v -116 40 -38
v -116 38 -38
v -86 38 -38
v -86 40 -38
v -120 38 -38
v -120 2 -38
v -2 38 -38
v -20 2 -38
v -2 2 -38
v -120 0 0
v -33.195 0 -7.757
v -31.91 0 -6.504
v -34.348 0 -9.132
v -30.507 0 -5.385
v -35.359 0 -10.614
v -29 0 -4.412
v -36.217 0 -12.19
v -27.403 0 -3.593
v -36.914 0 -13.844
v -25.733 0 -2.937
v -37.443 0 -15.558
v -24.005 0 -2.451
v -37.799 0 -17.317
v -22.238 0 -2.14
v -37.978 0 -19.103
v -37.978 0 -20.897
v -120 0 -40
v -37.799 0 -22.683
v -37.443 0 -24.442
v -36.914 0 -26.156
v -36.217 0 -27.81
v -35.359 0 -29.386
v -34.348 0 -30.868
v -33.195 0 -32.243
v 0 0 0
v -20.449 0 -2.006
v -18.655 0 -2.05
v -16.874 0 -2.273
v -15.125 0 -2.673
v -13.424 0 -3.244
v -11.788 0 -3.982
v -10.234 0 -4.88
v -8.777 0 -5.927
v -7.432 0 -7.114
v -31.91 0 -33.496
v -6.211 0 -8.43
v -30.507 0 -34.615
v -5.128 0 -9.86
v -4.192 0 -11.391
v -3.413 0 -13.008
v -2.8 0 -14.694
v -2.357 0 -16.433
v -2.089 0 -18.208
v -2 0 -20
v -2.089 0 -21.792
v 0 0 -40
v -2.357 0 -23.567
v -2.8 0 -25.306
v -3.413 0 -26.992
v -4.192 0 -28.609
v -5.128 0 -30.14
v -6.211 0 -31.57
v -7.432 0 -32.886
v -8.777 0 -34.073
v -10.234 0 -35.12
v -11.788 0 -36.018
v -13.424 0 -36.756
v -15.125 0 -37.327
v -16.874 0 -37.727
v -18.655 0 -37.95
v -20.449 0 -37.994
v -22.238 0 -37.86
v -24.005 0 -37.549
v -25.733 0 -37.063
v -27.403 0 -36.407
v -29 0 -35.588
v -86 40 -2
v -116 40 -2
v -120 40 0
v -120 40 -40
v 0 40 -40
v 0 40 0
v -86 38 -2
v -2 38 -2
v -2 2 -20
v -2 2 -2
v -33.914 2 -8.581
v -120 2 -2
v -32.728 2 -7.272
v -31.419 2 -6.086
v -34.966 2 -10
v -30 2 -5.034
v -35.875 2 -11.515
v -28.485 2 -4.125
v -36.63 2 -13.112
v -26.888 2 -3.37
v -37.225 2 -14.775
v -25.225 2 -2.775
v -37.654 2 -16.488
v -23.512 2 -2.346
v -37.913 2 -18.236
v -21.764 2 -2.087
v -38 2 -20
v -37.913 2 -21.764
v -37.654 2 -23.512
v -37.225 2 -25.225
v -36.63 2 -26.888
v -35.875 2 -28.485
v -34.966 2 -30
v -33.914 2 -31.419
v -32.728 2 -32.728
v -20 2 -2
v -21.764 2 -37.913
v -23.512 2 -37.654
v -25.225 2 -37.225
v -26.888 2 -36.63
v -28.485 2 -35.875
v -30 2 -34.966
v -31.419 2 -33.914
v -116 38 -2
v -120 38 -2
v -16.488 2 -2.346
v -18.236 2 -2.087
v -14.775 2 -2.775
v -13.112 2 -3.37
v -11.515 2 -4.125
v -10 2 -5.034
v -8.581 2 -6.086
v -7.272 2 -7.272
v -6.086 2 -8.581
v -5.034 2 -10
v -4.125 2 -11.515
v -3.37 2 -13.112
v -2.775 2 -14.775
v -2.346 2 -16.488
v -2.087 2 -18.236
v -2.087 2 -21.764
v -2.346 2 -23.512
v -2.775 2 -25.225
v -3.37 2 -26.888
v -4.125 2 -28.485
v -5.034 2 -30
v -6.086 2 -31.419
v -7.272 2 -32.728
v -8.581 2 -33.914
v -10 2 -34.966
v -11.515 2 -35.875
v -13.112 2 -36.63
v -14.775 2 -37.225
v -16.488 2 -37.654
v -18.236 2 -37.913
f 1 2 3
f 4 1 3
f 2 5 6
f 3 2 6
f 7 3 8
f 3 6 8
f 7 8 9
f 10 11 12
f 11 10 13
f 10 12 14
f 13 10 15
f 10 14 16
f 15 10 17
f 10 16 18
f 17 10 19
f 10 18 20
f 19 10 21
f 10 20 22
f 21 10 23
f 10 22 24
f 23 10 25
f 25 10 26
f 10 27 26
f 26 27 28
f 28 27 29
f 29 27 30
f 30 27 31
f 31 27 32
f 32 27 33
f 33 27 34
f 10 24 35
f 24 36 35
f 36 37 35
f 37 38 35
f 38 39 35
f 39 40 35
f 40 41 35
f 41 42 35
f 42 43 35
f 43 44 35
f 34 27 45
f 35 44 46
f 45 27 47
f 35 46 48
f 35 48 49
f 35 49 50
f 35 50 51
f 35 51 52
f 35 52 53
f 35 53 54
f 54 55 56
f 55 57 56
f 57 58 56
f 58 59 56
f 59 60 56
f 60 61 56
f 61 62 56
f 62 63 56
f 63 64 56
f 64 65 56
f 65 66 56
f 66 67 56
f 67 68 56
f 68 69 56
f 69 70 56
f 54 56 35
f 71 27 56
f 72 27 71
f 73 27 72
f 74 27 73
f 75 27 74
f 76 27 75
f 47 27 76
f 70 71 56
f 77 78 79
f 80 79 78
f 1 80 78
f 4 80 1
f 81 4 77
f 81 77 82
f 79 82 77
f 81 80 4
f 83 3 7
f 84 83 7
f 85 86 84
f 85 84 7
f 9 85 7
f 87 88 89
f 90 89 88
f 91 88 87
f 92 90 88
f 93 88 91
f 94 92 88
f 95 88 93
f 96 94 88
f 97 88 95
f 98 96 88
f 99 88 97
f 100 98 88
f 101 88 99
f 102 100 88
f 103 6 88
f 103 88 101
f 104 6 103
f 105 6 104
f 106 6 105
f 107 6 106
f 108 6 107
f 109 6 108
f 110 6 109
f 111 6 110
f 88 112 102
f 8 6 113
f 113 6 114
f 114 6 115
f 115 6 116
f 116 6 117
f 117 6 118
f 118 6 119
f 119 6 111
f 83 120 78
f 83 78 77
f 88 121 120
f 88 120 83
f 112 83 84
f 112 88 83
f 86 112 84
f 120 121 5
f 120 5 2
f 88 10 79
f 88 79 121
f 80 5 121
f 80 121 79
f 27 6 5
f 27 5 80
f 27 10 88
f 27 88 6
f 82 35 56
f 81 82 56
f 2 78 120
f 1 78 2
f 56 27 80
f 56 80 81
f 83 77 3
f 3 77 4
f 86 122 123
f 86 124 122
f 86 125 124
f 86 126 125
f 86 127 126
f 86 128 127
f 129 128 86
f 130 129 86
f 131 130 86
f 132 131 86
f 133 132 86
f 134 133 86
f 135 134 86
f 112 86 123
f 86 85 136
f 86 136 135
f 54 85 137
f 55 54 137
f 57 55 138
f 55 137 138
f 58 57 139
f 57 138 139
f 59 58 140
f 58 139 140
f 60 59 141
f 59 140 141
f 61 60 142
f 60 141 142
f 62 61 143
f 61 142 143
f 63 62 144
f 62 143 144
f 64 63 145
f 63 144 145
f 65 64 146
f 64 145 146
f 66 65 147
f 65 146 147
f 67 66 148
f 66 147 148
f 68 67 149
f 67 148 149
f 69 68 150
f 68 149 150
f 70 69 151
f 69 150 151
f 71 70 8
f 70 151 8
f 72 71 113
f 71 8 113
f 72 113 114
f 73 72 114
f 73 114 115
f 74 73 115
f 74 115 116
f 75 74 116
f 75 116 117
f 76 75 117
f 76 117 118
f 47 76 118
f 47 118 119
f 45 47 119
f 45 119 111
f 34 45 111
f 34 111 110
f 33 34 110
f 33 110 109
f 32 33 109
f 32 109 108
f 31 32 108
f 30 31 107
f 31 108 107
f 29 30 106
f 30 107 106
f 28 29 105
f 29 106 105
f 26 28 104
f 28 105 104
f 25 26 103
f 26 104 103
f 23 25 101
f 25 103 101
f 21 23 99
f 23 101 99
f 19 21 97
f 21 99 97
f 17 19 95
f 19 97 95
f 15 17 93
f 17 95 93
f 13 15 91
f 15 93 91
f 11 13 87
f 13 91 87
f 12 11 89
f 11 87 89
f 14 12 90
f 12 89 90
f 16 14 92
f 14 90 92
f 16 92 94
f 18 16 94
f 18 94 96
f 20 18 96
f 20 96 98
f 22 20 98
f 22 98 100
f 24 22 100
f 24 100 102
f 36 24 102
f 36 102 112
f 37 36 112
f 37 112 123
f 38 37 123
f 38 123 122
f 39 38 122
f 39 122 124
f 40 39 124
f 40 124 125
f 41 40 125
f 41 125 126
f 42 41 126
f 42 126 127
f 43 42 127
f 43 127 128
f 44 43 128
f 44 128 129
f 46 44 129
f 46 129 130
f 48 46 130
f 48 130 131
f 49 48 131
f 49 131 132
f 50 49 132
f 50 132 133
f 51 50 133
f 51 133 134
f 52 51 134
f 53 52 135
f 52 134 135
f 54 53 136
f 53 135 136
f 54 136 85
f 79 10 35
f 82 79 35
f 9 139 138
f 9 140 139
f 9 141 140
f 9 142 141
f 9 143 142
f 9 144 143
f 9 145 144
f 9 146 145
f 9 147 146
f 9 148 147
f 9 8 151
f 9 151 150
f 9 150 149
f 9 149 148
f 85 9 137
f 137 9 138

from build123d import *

# Parameters (mm, degrees)
SKETCH1_W           = 120
SKETCH1_H           = 40
BOSS_EXTRUDE1_DEPTH = 40
SHELL1_T            = -2
SKETCH2_R           = 18
CUT_EXTRUDE1_DEPTH  = 3
CUT_EXTRUDE2_REACH  = 42
SKETCH3_W           = 30
SKETCH3_H           = 36


with BuildPart() as part:
    # Sketch1 → Boss-Extrude1 (new body)
    with BuildSketch(Plane(origin=(0, 0, 0), x_dir=(1, 0, 0), z_dir=(0, 1, 0))):
        with Locations((-60, 20)):
            Rectangle(SKETCH1_W, SKETCH1_H)
    extrude(amount=BOSS_EXTRUDE1_DEPTH)

    # Shell1
    shell1_openings = [part.faces().sort_by_distance(p)[0] for p in [
        (-120, 20, -20),
    ]]
    offset(amount=SHELL1_T, openings=shell1_openings, kind=Kind.INTERSECTION)

    # Sketch2 → Cut-Extrude1 (cut, through all)
    with BuildSketch(Plane(origin=(0, 2, 0), x_dir=(1, 0, 0), z_dir=(0, 1, 0))):
        with Locations((-20, 20)):
            Circle(SKETCH2_R)
    extrude(amount=-CUT_EXTRUDE1_DEPTH, mode=Mode.SUBTRACT)

    # Sketch3 → Cut-Extrude2 (cut, up to next)
    with BuildSketch(Plane(origin=(0, 40, 0), x_dir=(1, 0, 0), z_dir=(0, 1, 0)), mode=Mode.PRIVATE) as cut_extrude2_sk1:
        with Locations((-101, 20)):
            Rectangle(SKETCH3_W, SKETCH3_H)
    cut_extrude2_tool1 = extrude(cut_extrude2_sk1.sketch, amount=-CUT_EXTRUDE2_REACH, mode=Mode.PRIVATE) & part.part
    add(cut_extrude2_tool1.solids().sort_by_distance((-101, 40, -20))[0], mode=Mode.SUBTRACT)


solid = part.part
